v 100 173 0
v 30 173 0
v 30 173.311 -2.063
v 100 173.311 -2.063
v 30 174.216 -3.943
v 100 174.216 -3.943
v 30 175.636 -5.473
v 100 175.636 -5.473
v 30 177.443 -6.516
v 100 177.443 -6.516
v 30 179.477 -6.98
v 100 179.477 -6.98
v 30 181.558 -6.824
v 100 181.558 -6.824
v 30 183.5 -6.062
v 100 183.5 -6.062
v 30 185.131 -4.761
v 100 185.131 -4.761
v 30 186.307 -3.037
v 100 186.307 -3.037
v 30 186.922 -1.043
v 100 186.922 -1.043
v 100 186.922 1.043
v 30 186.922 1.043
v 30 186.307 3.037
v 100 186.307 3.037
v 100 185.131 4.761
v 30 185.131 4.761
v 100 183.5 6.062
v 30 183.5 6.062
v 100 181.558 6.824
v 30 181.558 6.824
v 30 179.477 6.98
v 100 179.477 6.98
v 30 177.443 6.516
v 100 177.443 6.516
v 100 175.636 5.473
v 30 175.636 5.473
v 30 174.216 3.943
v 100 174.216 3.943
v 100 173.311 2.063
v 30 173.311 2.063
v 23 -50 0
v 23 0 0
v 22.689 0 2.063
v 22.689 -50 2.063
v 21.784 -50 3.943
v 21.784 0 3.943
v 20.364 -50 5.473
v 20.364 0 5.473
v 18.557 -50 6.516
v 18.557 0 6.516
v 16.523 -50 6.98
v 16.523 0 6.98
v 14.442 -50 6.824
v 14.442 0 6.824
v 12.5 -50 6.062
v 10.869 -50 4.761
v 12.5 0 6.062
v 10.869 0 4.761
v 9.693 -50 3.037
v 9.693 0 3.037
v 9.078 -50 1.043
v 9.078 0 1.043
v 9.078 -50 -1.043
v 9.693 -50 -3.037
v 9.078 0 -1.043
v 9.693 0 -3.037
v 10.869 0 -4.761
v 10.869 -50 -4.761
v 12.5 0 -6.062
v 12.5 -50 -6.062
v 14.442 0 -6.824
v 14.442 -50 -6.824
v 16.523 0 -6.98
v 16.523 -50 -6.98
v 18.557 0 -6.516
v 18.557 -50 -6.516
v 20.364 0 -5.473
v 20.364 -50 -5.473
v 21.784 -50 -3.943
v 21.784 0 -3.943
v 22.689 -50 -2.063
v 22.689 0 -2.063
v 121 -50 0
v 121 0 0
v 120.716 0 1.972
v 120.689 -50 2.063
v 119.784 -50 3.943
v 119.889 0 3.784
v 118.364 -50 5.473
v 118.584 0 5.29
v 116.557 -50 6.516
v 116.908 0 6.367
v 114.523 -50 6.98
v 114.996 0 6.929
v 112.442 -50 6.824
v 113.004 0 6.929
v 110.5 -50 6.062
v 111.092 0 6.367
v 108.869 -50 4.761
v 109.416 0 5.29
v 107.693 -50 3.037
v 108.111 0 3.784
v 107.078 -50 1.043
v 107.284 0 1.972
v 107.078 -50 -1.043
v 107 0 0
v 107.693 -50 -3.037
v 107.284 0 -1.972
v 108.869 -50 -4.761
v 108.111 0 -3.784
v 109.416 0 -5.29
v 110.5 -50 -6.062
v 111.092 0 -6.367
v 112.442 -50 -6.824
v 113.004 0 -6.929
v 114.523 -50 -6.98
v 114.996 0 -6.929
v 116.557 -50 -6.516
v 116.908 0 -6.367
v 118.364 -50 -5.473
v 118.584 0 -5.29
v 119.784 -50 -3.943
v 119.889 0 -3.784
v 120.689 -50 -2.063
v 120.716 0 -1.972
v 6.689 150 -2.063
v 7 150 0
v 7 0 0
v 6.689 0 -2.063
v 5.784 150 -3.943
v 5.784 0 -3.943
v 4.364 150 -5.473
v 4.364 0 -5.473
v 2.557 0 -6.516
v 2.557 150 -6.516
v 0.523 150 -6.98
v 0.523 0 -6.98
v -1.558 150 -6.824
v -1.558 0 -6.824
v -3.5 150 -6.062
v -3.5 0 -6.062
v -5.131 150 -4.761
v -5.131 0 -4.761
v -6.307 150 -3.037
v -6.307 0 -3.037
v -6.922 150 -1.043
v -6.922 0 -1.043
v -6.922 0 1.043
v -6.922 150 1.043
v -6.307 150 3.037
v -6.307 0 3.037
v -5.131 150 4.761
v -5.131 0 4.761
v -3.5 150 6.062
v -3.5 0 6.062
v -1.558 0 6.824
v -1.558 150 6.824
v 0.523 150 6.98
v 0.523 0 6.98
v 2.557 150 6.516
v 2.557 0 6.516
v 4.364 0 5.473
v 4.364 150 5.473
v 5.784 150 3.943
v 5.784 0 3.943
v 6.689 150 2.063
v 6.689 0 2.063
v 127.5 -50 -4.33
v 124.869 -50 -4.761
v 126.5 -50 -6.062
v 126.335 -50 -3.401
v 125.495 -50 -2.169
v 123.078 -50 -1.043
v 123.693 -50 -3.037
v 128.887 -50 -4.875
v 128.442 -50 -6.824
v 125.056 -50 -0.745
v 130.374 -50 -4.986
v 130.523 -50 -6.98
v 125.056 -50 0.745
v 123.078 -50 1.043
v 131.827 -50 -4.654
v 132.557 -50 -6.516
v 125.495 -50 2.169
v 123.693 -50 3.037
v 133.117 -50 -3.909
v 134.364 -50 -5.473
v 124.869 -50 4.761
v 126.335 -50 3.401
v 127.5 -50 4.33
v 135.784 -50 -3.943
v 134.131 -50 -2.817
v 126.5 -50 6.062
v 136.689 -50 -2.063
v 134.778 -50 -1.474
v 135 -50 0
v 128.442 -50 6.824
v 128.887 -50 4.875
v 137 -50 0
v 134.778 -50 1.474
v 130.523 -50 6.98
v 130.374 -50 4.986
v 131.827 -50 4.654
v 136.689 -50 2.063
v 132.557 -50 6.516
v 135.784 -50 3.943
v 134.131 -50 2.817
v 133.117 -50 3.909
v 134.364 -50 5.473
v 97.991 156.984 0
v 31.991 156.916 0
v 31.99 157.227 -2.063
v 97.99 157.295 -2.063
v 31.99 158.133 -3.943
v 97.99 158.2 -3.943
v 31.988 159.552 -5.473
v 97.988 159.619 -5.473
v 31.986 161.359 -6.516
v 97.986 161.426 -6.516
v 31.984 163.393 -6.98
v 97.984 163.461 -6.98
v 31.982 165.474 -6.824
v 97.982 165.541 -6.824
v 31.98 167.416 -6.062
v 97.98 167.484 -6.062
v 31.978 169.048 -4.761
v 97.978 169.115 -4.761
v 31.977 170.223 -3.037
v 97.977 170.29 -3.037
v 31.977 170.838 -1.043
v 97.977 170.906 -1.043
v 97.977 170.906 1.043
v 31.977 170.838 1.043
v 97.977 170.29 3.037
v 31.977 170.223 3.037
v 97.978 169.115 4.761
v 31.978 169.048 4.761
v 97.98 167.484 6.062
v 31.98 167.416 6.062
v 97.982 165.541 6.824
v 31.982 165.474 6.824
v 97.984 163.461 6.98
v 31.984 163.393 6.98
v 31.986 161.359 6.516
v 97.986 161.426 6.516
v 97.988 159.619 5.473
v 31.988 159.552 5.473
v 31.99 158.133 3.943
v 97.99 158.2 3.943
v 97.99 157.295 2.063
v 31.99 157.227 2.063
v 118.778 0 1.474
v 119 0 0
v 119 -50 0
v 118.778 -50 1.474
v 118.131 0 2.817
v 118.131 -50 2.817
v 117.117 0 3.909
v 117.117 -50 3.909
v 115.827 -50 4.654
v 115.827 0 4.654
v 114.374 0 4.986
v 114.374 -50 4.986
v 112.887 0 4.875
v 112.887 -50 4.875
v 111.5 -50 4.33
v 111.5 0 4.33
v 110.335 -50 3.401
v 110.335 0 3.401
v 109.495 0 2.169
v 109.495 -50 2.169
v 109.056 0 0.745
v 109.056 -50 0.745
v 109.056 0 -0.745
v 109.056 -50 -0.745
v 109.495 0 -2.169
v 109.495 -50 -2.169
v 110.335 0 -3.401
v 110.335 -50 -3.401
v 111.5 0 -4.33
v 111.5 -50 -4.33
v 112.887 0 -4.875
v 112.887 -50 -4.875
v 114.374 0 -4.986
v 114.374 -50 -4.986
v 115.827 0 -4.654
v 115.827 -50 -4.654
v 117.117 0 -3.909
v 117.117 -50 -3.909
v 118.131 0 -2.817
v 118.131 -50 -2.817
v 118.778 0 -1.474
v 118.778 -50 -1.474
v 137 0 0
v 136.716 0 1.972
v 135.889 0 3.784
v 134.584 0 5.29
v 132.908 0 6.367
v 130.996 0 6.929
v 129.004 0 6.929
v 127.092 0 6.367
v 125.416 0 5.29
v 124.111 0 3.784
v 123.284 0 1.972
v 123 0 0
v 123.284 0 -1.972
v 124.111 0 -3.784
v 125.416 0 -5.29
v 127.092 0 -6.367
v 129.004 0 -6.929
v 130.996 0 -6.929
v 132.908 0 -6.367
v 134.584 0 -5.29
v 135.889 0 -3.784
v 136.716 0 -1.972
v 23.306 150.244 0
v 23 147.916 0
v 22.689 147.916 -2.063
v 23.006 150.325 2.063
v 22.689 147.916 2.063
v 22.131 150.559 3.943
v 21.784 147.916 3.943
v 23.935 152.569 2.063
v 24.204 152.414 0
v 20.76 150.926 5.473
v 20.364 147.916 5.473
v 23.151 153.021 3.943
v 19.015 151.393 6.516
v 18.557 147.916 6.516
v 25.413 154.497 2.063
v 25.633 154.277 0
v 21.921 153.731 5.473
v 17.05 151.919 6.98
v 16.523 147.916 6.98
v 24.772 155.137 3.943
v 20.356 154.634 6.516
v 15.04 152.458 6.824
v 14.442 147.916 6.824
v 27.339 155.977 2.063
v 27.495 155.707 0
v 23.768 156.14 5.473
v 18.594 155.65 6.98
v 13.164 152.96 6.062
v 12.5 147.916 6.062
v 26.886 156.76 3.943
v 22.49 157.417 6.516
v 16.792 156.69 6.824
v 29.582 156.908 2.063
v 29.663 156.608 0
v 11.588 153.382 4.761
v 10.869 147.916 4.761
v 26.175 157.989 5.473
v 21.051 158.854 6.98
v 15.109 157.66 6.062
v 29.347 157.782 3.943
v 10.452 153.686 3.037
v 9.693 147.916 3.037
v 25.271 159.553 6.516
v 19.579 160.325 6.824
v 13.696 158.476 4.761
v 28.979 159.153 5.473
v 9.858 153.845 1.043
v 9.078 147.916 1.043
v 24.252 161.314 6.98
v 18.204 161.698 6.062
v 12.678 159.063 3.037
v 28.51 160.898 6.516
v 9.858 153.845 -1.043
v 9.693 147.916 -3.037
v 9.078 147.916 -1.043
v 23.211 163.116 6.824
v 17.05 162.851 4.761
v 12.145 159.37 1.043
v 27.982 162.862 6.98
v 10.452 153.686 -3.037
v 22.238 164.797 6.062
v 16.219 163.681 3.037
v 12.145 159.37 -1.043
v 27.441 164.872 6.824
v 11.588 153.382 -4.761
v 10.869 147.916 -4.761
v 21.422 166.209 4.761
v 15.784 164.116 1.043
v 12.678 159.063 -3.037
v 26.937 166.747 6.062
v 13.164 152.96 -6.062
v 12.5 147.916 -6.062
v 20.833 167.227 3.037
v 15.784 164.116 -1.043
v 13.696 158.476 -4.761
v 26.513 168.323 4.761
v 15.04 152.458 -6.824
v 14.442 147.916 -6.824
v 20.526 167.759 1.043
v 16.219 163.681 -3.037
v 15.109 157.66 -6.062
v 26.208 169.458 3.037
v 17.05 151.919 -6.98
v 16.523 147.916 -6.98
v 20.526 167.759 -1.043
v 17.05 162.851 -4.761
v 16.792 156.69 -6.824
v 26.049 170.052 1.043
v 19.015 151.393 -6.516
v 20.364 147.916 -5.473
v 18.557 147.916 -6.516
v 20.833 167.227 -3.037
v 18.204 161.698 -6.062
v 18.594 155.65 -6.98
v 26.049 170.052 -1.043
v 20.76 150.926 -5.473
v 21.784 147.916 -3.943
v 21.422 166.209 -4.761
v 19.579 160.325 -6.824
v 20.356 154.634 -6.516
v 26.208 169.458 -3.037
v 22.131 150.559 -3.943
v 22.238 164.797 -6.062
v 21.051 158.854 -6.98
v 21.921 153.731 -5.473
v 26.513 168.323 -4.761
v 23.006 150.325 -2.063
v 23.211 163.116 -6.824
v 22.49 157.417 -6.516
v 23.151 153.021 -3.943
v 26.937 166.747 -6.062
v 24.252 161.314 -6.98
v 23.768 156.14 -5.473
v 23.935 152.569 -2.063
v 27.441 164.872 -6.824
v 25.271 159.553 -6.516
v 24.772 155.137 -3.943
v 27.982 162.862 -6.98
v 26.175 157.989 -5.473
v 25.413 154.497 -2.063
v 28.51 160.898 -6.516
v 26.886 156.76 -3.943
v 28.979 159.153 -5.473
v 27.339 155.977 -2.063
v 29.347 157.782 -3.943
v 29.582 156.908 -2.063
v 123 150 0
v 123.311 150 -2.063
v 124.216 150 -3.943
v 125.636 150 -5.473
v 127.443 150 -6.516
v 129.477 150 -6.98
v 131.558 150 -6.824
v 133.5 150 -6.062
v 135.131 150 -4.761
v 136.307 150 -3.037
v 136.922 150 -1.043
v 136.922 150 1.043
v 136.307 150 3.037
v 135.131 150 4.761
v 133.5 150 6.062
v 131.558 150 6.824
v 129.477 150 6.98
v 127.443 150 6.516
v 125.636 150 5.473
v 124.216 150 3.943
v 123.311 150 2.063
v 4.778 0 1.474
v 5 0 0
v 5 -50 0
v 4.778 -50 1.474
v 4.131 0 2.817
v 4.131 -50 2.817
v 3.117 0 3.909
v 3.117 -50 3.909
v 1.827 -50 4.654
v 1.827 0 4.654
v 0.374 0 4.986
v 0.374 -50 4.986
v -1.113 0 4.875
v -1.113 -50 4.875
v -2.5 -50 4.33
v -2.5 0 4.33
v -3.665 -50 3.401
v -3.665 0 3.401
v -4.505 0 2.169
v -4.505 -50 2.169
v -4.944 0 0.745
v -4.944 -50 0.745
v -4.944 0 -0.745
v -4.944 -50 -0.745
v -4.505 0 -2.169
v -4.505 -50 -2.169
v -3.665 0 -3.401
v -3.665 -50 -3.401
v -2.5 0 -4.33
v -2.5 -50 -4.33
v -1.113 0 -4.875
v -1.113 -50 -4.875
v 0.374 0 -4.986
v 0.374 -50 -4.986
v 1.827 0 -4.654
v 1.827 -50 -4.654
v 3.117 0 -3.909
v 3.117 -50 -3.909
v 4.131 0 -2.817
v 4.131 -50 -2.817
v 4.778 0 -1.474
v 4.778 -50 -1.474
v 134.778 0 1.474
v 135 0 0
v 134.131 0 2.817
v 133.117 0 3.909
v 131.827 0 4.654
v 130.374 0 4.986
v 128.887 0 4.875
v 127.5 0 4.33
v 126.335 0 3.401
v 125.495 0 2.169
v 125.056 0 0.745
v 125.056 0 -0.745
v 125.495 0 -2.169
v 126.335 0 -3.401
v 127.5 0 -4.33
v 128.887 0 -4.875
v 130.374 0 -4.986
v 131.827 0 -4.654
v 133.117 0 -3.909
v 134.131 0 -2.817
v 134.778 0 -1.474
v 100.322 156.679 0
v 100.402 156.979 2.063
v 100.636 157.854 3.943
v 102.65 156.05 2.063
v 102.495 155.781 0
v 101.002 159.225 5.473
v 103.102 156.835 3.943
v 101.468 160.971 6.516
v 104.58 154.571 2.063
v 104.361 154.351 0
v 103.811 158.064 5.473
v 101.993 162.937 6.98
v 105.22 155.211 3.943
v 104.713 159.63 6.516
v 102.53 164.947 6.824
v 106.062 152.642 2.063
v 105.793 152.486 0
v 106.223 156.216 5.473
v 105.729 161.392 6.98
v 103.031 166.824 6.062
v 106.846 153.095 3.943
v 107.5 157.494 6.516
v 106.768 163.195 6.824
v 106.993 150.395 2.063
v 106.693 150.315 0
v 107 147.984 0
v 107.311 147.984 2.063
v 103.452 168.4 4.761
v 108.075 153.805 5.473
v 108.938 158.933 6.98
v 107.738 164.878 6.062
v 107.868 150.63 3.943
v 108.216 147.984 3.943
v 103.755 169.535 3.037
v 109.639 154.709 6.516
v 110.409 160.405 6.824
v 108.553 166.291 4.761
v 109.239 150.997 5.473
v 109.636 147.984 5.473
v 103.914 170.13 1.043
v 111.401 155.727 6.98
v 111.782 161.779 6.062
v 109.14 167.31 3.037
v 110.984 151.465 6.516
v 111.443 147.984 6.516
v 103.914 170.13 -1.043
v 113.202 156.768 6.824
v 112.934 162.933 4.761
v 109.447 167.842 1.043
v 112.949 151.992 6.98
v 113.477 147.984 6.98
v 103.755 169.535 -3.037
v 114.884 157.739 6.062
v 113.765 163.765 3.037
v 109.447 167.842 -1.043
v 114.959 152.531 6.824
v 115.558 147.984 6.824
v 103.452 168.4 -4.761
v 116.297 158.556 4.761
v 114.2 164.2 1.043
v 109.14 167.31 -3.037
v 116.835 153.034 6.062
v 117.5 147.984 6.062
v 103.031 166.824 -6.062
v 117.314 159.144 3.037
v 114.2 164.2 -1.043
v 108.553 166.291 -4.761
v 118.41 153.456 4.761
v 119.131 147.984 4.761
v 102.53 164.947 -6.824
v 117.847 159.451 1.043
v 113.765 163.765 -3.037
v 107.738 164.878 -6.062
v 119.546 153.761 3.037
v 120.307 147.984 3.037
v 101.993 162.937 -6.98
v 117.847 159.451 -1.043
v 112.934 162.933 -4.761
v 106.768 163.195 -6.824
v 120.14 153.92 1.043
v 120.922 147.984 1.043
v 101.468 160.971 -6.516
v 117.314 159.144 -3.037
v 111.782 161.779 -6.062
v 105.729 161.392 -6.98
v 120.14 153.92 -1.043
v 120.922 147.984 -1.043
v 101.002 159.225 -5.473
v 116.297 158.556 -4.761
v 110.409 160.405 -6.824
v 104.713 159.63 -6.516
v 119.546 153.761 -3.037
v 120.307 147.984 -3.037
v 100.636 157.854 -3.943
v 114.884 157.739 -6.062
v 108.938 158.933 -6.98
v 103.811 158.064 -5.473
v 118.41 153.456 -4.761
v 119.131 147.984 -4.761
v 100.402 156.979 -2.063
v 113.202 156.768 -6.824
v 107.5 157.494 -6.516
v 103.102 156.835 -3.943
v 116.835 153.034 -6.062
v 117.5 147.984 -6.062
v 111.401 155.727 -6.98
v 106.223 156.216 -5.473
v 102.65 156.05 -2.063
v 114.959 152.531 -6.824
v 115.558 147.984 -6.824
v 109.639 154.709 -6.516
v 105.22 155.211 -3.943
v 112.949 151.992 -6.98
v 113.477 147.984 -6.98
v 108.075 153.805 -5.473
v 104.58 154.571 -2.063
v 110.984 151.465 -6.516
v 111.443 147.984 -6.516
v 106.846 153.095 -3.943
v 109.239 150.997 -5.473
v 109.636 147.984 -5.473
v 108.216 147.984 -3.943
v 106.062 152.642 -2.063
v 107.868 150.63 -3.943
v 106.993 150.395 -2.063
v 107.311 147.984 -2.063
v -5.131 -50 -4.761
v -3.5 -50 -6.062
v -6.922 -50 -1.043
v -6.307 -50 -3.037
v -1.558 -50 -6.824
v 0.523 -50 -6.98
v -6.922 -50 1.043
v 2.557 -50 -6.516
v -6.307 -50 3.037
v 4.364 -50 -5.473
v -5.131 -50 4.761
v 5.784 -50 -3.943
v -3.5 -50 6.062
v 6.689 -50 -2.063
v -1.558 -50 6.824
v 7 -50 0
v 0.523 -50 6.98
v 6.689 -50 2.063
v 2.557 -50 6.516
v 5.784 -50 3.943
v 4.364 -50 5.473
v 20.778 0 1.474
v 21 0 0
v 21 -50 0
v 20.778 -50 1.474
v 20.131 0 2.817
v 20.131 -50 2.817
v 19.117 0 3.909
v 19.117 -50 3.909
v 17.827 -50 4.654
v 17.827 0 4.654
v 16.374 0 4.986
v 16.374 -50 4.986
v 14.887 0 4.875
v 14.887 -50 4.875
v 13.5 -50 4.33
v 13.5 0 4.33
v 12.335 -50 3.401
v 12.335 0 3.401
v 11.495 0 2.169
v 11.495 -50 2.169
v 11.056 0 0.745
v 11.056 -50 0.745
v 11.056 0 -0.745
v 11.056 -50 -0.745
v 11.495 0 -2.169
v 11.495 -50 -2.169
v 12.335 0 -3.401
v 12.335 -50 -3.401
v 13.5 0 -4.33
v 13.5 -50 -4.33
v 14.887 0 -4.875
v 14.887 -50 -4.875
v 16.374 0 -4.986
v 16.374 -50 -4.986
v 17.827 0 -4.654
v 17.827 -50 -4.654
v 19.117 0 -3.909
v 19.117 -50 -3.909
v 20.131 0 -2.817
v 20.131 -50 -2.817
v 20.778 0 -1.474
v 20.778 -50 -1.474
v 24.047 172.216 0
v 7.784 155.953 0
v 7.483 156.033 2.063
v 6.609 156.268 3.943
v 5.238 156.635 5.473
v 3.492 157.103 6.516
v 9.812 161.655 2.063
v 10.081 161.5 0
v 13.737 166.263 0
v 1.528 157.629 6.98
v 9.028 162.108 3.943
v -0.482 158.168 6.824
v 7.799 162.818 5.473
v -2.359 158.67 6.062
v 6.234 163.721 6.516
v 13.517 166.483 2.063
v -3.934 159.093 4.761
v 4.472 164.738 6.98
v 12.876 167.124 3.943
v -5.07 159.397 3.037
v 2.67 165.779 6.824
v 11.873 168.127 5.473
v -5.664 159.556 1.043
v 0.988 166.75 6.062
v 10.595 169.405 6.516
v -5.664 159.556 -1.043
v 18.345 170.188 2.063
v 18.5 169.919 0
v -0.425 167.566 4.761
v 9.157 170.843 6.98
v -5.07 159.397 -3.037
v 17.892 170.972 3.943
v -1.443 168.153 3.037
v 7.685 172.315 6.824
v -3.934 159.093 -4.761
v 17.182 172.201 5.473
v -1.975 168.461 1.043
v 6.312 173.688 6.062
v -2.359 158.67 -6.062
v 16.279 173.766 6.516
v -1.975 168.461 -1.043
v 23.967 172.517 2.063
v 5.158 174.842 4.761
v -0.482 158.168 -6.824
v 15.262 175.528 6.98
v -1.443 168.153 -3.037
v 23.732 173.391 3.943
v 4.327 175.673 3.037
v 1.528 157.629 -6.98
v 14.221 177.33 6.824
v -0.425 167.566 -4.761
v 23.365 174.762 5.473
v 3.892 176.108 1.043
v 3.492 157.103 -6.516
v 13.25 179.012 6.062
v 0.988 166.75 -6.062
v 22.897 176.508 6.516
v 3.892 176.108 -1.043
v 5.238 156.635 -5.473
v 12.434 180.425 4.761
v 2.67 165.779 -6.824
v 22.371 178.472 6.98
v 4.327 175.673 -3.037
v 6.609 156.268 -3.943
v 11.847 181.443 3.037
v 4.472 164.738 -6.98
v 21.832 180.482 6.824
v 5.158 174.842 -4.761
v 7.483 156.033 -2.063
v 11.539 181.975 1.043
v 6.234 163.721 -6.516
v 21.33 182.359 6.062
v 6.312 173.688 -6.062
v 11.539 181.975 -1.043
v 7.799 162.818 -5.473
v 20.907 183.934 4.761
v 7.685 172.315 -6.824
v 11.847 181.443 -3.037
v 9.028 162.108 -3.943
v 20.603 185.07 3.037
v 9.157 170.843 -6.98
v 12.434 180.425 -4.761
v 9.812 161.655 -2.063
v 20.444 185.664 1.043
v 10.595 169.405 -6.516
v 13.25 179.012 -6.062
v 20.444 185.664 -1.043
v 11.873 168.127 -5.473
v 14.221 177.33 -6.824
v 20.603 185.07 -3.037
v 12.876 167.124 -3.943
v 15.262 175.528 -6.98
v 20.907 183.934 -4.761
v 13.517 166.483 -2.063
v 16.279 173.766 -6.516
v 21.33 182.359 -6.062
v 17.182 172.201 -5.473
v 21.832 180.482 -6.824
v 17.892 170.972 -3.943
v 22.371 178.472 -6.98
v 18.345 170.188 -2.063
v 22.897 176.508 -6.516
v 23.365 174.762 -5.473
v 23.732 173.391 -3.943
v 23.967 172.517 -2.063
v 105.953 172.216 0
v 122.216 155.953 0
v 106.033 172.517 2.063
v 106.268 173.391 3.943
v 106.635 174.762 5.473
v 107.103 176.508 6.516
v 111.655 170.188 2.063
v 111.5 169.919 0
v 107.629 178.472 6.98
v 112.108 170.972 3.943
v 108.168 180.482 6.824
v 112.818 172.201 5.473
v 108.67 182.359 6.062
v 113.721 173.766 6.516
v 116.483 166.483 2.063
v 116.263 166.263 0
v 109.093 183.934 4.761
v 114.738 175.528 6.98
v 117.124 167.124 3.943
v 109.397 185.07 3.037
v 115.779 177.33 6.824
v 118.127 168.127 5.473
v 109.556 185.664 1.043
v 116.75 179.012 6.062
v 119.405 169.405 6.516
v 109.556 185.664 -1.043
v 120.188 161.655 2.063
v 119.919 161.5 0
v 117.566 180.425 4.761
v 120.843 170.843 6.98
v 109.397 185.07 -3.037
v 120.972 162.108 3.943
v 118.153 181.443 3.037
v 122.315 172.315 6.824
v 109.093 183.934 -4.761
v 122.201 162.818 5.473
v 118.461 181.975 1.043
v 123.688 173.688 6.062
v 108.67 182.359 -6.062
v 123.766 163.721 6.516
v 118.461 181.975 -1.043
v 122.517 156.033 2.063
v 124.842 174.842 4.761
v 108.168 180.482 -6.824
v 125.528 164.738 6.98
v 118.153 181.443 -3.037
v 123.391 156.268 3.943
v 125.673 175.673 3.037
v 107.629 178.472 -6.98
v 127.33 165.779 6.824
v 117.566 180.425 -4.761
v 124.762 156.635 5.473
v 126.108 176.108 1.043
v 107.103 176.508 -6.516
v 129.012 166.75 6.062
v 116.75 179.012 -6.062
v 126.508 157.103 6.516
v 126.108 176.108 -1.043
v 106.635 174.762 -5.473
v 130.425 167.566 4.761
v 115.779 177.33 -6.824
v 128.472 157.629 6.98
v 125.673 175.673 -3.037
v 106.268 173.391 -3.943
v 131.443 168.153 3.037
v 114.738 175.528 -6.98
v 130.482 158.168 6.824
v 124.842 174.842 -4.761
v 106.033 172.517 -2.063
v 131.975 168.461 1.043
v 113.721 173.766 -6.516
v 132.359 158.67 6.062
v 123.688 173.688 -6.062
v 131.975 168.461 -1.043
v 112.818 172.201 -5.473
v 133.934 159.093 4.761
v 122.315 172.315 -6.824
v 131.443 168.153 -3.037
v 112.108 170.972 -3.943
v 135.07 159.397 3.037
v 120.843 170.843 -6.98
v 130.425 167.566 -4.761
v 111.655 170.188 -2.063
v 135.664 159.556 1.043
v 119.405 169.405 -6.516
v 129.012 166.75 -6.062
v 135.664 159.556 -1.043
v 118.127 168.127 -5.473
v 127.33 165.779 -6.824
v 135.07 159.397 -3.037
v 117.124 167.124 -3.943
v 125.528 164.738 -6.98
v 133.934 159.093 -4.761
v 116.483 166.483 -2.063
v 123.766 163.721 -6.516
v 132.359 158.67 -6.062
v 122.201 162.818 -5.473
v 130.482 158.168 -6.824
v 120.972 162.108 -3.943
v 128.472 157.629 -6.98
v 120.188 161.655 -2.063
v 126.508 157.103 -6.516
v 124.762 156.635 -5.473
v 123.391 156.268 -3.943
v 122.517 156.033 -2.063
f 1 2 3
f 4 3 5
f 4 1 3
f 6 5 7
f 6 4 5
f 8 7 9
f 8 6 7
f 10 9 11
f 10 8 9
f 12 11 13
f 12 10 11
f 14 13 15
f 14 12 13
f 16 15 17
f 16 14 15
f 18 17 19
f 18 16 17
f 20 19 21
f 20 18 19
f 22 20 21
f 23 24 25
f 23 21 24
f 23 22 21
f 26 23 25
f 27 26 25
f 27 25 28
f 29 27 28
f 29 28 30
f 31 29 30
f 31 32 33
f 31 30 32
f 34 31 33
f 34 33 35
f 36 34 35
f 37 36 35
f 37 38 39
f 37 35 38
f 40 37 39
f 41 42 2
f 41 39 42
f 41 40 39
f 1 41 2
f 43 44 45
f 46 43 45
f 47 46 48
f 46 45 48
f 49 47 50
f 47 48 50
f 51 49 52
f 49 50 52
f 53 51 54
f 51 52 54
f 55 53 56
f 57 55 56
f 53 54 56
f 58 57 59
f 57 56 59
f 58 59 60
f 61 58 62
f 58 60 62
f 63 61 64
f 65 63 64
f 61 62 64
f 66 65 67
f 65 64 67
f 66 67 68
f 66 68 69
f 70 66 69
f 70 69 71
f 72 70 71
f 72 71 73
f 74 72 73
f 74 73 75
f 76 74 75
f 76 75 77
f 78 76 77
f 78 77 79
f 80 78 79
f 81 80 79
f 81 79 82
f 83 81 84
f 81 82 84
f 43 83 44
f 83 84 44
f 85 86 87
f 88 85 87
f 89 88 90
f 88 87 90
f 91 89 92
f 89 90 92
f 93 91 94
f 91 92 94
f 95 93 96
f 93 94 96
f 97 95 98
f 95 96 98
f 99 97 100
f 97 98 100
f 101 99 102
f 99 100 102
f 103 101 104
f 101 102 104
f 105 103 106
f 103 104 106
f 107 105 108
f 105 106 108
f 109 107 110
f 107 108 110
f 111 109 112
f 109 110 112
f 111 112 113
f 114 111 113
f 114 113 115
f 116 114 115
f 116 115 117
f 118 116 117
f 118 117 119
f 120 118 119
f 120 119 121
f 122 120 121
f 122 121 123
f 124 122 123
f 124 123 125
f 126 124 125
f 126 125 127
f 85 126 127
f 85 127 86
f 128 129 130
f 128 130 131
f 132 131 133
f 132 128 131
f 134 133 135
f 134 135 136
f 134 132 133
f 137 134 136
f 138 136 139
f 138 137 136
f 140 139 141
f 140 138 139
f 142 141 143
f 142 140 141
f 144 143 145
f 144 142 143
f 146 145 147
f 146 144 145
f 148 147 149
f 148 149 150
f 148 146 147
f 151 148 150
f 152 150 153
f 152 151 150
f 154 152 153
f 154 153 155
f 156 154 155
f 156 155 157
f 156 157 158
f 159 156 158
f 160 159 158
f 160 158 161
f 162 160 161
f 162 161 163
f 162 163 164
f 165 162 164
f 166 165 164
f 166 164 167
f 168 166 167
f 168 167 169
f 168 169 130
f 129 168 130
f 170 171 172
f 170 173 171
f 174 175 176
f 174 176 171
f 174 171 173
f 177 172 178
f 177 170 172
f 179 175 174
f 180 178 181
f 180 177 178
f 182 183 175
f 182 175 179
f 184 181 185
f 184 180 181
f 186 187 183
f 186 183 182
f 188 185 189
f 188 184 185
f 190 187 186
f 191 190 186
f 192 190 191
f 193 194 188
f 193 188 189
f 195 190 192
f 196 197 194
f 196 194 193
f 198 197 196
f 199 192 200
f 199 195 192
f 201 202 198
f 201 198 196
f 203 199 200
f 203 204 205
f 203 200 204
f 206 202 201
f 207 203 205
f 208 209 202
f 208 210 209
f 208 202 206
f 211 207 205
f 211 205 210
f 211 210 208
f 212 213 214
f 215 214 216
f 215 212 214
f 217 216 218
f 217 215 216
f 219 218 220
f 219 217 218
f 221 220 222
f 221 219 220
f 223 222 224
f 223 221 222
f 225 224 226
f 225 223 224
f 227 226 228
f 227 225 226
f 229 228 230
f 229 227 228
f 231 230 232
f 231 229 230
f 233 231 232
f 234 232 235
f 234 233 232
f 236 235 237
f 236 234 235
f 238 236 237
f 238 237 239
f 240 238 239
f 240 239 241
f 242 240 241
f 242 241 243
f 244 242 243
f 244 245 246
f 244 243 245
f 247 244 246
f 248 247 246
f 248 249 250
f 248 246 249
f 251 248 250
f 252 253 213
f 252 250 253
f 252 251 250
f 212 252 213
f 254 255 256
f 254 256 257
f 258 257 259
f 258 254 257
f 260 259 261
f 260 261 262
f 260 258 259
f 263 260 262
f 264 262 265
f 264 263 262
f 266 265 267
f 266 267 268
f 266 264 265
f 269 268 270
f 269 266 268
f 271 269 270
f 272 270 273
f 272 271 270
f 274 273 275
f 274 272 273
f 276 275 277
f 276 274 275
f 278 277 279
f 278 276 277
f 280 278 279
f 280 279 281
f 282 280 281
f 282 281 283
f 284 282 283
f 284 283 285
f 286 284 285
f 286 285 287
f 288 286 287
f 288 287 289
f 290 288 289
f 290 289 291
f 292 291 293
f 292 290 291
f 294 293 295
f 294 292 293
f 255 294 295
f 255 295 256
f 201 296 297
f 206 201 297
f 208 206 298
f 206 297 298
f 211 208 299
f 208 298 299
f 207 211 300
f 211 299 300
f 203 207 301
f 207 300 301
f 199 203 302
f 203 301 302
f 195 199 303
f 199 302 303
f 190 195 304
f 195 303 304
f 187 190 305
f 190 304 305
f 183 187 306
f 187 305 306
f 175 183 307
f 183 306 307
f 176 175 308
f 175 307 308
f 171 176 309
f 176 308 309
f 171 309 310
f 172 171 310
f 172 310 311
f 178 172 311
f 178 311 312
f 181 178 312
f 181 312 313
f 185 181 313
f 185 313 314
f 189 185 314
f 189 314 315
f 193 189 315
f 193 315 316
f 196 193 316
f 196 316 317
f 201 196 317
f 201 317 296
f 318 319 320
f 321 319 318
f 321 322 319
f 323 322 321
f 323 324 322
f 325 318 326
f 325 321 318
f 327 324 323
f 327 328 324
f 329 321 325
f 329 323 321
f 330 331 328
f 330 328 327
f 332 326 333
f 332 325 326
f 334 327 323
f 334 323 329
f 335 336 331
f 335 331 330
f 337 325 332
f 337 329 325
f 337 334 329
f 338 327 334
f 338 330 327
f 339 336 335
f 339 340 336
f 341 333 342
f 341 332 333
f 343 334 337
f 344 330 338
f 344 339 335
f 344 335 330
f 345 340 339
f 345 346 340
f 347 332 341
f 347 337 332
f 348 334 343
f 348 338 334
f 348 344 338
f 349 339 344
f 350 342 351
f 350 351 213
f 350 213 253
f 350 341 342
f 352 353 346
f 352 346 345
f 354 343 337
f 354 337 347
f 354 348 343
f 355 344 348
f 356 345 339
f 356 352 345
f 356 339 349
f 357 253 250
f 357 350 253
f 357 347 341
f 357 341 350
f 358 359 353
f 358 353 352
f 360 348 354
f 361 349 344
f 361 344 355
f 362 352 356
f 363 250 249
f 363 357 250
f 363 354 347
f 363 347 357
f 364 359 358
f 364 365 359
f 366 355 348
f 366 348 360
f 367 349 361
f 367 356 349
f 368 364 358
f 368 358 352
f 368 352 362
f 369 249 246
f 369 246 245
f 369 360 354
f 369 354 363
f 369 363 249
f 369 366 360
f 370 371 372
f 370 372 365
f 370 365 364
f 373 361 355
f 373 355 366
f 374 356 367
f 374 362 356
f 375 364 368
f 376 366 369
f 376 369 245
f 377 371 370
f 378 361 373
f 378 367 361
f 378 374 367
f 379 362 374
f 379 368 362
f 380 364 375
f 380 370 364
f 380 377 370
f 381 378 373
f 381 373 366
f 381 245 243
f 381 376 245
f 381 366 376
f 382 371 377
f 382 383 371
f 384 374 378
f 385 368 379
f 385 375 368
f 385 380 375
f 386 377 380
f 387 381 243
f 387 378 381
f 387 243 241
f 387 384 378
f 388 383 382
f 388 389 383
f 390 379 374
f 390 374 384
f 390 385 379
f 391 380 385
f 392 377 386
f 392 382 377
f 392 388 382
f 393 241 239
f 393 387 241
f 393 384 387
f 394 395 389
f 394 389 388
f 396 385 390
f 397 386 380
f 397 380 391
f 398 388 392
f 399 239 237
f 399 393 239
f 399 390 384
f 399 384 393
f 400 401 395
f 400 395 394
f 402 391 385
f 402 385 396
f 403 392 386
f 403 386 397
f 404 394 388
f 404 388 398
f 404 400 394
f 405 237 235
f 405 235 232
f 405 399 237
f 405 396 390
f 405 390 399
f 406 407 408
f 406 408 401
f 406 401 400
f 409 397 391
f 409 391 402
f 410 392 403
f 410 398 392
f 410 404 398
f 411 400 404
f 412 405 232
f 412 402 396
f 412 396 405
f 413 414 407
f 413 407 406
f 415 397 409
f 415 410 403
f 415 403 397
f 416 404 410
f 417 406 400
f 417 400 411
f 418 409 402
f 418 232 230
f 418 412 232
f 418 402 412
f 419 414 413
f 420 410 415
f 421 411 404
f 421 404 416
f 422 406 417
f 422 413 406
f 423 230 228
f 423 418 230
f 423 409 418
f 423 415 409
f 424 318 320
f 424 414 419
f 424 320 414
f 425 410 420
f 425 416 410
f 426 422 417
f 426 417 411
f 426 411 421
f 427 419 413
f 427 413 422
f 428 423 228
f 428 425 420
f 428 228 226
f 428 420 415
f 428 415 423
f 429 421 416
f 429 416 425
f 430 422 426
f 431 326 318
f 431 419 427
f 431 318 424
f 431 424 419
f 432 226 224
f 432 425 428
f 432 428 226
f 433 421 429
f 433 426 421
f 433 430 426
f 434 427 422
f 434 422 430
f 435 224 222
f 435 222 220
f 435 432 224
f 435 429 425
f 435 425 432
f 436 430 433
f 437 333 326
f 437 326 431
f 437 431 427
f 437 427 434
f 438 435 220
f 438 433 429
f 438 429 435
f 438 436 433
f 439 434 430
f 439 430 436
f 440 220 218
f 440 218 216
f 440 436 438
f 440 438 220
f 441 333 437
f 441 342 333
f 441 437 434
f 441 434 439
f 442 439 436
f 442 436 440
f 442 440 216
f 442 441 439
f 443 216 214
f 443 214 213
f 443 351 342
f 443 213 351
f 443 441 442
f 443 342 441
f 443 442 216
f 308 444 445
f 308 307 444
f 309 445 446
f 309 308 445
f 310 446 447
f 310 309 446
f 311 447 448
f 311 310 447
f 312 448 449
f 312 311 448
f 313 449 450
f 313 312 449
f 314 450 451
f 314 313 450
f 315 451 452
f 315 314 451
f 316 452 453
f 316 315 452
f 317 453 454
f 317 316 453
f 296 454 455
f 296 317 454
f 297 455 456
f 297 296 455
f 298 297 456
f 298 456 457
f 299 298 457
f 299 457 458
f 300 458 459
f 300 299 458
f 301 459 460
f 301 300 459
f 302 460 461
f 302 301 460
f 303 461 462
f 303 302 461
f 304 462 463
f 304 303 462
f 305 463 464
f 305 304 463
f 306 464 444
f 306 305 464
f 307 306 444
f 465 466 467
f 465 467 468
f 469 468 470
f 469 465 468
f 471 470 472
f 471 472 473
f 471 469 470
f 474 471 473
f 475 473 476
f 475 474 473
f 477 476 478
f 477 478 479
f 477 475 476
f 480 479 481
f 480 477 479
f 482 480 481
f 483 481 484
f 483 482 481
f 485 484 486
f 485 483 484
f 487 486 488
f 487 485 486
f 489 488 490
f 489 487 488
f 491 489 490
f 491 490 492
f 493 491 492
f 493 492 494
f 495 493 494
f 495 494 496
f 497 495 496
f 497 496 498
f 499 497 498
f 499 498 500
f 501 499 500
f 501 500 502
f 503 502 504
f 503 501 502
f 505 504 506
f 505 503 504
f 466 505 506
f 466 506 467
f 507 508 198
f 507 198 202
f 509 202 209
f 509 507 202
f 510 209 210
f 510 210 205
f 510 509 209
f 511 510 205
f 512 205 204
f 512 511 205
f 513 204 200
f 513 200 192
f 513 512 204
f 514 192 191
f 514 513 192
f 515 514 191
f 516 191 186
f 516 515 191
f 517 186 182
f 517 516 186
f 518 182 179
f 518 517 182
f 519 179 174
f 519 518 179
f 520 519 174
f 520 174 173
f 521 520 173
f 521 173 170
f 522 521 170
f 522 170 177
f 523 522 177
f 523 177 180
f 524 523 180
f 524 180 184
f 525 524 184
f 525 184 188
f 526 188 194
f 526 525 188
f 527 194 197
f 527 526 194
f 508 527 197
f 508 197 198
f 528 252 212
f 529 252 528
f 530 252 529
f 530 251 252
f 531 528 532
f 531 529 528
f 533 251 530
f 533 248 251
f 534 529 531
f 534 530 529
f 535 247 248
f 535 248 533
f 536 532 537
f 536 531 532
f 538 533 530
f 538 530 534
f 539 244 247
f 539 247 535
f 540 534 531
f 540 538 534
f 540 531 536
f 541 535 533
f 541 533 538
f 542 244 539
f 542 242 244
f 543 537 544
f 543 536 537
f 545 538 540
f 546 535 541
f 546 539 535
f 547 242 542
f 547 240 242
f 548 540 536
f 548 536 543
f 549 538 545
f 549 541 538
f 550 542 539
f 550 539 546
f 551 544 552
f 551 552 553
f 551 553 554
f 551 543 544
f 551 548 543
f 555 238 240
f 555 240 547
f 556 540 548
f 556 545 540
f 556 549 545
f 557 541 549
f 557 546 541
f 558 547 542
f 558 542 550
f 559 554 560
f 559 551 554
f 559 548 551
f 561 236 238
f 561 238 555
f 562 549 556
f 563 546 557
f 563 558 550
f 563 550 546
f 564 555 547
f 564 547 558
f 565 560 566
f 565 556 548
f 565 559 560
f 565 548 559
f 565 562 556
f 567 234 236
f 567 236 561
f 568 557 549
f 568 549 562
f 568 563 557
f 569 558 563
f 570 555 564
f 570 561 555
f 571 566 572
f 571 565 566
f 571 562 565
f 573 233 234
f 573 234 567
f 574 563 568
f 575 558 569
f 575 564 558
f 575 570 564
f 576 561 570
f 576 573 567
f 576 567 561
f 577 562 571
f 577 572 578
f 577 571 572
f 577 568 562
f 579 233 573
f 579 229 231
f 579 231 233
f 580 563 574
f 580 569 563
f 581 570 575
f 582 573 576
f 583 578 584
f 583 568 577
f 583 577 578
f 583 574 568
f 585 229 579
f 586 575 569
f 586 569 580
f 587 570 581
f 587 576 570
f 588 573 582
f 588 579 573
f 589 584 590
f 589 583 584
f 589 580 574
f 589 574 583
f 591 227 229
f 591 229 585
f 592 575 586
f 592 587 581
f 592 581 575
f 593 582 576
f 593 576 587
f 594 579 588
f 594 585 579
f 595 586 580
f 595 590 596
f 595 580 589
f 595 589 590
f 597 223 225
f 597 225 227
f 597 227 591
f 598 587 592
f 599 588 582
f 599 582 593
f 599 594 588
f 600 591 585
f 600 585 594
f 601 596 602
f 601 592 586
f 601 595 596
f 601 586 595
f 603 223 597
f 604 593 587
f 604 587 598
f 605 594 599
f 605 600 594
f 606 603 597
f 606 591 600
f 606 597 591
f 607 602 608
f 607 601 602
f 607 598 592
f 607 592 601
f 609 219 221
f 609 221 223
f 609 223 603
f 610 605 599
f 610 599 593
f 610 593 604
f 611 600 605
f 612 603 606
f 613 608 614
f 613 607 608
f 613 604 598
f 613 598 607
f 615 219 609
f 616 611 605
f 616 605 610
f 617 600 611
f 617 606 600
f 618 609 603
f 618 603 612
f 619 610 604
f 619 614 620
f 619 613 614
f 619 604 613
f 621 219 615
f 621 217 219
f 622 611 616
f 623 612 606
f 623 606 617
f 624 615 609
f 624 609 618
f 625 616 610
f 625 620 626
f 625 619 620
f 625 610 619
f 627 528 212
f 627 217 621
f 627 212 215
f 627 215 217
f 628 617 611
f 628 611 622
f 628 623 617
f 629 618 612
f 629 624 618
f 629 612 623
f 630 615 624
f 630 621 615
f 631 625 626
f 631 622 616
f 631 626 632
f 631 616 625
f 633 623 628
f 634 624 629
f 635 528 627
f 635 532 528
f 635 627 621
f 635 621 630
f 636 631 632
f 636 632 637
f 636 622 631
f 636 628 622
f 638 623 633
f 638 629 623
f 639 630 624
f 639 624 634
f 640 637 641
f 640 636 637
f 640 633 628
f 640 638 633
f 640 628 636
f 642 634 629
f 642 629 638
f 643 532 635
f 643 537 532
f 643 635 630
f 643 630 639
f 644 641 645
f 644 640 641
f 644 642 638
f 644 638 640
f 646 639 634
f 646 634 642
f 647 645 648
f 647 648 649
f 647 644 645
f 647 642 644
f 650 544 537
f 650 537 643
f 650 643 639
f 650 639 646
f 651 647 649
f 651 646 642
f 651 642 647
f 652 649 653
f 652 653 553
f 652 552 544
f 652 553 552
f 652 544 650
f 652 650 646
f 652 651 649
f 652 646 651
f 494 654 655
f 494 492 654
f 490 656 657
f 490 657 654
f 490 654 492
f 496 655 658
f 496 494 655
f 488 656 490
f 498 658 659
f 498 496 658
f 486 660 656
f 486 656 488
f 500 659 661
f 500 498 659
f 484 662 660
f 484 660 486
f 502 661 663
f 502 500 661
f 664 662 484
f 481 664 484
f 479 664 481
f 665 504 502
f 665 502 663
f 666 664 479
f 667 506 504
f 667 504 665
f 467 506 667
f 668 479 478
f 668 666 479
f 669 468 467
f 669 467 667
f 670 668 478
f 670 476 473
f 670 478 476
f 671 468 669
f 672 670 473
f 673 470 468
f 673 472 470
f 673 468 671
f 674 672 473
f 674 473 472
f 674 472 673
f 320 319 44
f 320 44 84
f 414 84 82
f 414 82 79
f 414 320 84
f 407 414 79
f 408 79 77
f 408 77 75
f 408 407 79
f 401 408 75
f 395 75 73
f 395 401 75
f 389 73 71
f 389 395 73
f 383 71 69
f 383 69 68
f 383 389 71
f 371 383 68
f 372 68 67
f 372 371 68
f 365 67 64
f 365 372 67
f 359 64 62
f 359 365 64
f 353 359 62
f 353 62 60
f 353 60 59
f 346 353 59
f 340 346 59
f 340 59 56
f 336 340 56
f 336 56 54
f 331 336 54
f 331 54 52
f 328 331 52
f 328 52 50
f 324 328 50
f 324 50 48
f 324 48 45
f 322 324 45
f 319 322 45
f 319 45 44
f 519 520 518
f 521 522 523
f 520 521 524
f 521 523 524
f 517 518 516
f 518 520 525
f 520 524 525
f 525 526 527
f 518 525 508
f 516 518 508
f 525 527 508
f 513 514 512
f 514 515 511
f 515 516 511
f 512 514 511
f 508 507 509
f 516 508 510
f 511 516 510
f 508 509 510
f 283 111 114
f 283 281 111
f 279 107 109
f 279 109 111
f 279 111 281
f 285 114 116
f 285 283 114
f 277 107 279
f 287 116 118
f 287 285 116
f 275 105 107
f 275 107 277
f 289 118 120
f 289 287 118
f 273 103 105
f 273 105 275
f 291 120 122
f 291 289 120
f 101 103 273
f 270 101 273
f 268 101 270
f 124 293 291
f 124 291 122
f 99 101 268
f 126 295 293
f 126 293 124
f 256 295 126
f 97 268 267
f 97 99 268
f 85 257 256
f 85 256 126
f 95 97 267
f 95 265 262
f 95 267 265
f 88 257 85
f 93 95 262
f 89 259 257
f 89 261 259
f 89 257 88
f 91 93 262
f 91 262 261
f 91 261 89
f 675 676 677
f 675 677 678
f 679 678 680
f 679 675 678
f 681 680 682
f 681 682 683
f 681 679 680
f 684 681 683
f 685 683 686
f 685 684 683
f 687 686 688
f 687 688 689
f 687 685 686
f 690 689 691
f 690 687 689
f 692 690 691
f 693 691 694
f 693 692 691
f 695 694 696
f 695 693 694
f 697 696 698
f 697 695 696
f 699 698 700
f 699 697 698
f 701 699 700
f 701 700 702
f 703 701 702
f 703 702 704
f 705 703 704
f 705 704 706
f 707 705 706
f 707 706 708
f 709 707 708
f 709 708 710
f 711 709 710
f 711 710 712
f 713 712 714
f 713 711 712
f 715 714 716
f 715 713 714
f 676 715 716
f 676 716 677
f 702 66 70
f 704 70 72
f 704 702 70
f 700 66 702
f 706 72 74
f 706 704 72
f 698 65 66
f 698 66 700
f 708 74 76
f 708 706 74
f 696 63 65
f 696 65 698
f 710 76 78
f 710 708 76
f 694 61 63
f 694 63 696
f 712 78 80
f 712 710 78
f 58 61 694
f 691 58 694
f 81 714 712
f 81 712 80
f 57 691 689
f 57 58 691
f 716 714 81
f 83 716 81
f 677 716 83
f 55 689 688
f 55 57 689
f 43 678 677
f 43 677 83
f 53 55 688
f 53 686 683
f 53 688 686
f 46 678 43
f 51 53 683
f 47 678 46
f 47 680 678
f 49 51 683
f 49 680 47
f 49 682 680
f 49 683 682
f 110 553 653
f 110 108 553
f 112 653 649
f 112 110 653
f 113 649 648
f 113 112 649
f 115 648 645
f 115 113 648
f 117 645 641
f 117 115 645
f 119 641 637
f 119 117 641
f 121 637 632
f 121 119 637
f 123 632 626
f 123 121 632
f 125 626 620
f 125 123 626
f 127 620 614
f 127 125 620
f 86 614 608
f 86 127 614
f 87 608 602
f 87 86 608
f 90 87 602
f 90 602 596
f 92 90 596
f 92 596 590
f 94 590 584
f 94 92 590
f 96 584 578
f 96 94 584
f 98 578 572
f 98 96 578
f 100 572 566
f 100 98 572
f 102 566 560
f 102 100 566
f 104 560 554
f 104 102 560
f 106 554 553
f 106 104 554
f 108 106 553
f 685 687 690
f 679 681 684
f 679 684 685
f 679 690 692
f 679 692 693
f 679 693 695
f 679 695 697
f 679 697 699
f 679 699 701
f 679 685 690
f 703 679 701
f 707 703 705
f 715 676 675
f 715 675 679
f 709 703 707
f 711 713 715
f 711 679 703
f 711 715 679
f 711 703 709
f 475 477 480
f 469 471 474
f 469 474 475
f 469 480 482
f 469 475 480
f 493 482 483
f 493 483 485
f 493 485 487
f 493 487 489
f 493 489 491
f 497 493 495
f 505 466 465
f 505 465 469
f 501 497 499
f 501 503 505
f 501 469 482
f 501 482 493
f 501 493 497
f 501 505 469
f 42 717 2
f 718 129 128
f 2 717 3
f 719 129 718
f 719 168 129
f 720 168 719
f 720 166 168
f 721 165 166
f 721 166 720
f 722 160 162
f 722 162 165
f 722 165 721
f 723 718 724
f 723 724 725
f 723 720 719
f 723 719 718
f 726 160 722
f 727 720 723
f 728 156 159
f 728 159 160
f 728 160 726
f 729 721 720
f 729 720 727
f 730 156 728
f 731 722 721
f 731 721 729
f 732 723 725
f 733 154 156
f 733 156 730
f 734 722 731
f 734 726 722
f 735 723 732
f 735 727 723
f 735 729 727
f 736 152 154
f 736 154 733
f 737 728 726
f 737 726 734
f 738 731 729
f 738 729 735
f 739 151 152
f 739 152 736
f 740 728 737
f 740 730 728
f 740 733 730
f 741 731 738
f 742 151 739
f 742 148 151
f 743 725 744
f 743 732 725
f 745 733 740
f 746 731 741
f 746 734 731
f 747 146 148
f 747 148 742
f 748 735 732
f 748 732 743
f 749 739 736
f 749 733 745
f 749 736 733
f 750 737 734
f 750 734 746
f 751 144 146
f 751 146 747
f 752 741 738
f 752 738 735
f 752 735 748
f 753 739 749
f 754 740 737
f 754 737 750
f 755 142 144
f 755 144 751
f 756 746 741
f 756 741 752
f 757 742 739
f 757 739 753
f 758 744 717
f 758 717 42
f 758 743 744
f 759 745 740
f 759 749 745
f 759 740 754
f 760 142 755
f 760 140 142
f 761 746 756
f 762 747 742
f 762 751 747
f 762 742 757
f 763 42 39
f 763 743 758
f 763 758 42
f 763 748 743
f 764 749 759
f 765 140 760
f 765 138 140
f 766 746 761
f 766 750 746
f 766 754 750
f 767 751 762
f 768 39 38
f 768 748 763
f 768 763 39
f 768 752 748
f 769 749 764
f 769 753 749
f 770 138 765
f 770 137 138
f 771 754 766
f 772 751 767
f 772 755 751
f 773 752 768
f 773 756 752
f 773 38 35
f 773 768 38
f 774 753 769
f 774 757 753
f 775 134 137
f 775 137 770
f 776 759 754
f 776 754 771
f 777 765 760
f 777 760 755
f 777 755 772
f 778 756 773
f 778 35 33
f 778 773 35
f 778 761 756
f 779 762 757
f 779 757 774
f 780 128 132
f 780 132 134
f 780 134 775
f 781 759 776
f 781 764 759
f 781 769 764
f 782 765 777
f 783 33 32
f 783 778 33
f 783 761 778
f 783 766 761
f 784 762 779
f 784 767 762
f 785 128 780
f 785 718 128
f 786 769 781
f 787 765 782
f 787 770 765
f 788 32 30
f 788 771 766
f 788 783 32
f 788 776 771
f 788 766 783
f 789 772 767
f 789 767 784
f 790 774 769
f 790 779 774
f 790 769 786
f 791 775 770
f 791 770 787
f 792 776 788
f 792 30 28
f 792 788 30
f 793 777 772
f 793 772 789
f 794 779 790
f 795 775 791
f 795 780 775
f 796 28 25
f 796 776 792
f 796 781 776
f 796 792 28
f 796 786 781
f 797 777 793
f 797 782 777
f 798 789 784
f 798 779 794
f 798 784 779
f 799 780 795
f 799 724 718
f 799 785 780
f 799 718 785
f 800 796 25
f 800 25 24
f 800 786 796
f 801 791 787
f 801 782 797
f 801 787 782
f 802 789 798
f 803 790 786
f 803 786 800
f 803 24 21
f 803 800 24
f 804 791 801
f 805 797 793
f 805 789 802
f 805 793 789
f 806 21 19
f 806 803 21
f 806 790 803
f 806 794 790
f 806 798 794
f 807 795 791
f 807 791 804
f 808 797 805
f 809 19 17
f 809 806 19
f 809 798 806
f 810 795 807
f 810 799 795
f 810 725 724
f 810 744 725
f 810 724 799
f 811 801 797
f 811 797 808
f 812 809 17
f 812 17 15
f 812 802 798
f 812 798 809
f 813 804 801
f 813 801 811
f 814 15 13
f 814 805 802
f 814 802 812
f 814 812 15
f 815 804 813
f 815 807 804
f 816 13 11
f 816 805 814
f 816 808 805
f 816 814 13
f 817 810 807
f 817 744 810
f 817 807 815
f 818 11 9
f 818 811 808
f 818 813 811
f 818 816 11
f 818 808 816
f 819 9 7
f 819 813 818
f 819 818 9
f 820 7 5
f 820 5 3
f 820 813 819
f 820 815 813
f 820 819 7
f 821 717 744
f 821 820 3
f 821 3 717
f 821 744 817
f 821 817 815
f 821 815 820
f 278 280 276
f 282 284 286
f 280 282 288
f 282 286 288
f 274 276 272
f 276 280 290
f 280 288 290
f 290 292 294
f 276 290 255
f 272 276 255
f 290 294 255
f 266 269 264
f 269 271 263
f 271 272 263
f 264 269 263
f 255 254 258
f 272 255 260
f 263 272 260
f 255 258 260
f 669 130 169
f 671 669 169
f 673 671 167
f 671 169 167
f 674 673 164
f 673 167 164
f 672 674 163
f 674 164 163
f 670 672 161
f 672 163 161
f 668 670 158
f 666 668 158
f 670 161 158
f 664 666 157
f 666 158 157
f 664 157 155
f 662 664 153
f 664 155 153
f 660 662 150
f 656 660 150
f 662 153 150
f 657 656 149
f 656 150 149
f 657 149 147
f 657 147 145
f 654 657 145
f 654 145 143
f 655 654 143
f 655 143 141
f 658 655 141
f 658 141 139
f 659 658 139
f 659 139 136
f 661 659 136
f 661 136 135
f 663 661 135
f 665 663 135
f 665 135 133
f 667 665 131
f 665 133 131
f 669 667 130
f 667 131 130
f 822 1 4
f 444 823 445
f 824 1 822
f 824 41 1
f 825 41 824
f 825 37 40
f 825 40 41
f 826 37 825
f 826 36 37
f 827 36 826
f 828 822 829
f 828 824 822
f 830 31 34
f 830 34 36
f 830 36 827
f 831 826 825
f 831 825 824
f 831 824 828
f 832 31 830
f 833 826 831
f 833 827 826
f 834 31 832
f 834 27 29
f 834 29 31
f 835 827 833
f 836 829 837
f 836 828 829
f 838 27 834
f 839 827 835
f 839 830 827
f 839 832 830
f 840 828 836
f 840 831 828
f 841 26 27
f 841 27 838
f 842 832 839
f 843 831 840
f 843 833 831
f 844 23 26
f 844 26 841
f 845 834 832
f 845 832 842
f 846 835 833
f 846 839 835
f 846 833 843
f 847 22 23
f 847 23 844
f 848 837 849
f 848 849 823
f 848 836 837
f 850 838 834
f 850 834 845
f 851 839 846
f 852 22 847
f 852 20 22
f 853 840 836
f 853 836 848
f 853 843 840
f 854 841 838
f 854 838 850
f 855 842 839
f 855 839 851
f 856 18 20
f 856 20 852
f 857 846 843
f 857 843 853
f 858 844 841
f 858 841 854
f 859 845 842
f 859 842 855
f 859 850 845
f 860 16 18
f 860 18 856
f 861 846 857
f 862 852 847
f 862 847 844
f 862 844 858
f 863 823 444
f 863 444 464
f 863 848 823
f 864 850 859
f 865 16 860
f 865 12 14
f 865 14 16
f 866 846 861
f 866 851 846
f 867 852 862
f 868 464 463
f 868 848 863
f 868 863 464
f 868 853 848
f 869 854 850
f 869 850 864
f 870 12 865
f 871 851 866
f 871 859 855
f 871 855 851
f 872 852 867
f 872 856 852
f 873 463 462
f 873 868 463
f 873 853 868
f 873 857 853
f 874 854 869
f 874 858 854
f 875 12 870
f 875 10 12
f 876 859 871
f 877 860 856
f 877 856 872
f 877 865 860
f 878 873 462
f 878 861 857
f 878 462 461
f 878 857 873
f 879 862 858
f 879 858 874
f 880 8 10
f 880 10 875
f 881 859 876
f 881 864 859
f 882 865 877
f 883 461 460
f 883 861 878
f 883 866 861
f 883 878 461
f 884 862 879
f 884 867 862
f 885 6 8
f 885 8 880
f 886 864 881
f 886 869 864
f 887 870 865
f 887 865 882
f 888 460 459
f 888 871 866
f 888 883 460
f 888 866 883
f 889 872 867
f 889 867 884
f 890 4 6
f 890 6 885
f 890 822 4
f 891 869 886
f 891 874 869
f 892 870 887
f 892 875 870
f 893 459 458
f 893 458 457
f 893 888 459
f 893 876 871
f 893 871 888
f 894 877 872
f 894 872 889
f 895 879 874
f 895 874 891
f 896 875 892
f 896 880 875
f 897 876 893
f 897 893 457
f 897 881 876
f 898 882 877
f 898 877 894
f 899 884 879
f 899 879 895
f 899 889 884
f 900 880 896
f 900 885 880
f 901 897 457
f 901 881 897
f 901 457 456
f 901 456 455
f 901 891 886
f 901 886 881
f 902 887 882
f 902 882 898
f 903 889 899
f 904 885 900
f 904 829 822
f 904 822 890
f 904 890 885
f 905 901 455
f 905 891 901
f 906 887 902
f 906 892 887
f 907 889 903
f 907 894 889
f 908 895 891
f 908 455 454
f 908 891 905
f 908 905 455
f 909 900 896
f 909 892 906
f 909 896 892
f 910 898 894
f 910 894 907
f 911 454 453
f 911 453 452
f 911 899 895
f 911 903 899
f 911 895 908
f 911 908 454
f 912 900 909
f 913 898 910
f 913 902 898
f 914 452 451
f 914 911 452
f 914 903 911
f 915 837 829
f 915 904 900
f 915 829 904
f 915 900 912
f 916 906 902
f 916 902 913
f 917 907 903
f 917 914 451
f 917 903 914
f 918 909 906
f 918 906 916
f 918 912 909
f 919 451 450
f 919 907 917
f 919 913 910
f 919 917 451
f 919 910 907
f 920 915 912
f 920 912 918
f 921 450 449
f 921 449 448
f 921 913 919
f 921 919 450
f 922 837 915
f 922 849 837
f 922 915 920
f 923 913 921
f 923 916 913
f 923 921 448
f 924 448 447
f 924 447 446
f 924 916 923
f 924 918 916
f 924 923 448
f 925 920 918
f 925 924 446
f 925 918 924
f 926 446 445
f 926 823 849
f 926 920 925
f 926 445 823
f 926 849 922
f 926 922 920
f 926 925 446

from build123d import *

# Parameters (mm, degrees)
F1_R     = 7
F3_R     = 7
F3_R_2   = 5
F4_DEPTH = 50
F5_R     = 7
F8_R     = 7
F8_R_2   = 5
F9_DEPTH = 50


with BuildPart() as f2:
    # F2: sweep along a path in F0
    with BuildLine(Plane.XY) as f2_path:
        Line((0, 0), (0, 150))
        ThreePointArc((0, 150), (8.7867965644, 171.2132034356), (30, 180))
        Line((30, 180), (100, 180))
        ThreePointArc((100, 180), (121.2132034356, 171.2132034356), (130, 150))
        Line((130, 150), (130, 0))
    # F1 (on Front) → F2 (sweep)
    with BuildSketch(Plane.XZ):
        Circle(F1_R)
    sweep(path=f2_path.line)

    # F3 (on face) → F4 (join)
    with BuildSketch(Plane.XZ):
        Circle(F3_R)
        Circle(F3_R_2, mode=Mode.SUBTRACT)
        with Locations((130, 0)):
            Circle(F3_R)
        with Locations((130, 0)):
            Circle(F3_R_2, mode=Mode.SUBTRACT)
    extrude(amount=F4_DEPTH)


with BuildPart() as f7:
    # F7: sweep along a path in F6
    with BuildLine(Plane.XY) as f7_path:
        Line((16, 0), (16, 147.9161937333))
        ThreePointArc((16, 147.9161937333), (20.6805061796, 159.224113951), (31.9836324563, 163.9161853616))
        Line((31.9836324563, 163.9161853616), (97.9836324563, 163.9837015148))
        ThreePointArc((97.9836324563, 163.9837015148), (109.3079202177, 159.303203707), (114, 147.9837098866))
        Line((114, 147.9837098866), (114, 0))
    # F5 (on Front) → F7 (sweep)
    with BuildSketch(Plane.XZ):
        with Locations((16, 0)):
            Circle(F5_R)
    sweep(path=f7_path.line)

    # F8 (on face) → F9 (join)
    with BuildSketch(Plane.XZ):
        with Locations((16, 0)):
            Circle(F8_R)
        with Locations((16, 0)):
            Circle(F8_R_2, mode=Mode.SUBTRACT)
        with Locations((114, 0)):
            Circle(F8_R)
        with Locations((114, 0)):
            Circle(F8_R_2, mode=Mode.SUBTRACT)
    extrude(amount=F9_DEPTH)


solid = Compound([f2.part, f7.part])
